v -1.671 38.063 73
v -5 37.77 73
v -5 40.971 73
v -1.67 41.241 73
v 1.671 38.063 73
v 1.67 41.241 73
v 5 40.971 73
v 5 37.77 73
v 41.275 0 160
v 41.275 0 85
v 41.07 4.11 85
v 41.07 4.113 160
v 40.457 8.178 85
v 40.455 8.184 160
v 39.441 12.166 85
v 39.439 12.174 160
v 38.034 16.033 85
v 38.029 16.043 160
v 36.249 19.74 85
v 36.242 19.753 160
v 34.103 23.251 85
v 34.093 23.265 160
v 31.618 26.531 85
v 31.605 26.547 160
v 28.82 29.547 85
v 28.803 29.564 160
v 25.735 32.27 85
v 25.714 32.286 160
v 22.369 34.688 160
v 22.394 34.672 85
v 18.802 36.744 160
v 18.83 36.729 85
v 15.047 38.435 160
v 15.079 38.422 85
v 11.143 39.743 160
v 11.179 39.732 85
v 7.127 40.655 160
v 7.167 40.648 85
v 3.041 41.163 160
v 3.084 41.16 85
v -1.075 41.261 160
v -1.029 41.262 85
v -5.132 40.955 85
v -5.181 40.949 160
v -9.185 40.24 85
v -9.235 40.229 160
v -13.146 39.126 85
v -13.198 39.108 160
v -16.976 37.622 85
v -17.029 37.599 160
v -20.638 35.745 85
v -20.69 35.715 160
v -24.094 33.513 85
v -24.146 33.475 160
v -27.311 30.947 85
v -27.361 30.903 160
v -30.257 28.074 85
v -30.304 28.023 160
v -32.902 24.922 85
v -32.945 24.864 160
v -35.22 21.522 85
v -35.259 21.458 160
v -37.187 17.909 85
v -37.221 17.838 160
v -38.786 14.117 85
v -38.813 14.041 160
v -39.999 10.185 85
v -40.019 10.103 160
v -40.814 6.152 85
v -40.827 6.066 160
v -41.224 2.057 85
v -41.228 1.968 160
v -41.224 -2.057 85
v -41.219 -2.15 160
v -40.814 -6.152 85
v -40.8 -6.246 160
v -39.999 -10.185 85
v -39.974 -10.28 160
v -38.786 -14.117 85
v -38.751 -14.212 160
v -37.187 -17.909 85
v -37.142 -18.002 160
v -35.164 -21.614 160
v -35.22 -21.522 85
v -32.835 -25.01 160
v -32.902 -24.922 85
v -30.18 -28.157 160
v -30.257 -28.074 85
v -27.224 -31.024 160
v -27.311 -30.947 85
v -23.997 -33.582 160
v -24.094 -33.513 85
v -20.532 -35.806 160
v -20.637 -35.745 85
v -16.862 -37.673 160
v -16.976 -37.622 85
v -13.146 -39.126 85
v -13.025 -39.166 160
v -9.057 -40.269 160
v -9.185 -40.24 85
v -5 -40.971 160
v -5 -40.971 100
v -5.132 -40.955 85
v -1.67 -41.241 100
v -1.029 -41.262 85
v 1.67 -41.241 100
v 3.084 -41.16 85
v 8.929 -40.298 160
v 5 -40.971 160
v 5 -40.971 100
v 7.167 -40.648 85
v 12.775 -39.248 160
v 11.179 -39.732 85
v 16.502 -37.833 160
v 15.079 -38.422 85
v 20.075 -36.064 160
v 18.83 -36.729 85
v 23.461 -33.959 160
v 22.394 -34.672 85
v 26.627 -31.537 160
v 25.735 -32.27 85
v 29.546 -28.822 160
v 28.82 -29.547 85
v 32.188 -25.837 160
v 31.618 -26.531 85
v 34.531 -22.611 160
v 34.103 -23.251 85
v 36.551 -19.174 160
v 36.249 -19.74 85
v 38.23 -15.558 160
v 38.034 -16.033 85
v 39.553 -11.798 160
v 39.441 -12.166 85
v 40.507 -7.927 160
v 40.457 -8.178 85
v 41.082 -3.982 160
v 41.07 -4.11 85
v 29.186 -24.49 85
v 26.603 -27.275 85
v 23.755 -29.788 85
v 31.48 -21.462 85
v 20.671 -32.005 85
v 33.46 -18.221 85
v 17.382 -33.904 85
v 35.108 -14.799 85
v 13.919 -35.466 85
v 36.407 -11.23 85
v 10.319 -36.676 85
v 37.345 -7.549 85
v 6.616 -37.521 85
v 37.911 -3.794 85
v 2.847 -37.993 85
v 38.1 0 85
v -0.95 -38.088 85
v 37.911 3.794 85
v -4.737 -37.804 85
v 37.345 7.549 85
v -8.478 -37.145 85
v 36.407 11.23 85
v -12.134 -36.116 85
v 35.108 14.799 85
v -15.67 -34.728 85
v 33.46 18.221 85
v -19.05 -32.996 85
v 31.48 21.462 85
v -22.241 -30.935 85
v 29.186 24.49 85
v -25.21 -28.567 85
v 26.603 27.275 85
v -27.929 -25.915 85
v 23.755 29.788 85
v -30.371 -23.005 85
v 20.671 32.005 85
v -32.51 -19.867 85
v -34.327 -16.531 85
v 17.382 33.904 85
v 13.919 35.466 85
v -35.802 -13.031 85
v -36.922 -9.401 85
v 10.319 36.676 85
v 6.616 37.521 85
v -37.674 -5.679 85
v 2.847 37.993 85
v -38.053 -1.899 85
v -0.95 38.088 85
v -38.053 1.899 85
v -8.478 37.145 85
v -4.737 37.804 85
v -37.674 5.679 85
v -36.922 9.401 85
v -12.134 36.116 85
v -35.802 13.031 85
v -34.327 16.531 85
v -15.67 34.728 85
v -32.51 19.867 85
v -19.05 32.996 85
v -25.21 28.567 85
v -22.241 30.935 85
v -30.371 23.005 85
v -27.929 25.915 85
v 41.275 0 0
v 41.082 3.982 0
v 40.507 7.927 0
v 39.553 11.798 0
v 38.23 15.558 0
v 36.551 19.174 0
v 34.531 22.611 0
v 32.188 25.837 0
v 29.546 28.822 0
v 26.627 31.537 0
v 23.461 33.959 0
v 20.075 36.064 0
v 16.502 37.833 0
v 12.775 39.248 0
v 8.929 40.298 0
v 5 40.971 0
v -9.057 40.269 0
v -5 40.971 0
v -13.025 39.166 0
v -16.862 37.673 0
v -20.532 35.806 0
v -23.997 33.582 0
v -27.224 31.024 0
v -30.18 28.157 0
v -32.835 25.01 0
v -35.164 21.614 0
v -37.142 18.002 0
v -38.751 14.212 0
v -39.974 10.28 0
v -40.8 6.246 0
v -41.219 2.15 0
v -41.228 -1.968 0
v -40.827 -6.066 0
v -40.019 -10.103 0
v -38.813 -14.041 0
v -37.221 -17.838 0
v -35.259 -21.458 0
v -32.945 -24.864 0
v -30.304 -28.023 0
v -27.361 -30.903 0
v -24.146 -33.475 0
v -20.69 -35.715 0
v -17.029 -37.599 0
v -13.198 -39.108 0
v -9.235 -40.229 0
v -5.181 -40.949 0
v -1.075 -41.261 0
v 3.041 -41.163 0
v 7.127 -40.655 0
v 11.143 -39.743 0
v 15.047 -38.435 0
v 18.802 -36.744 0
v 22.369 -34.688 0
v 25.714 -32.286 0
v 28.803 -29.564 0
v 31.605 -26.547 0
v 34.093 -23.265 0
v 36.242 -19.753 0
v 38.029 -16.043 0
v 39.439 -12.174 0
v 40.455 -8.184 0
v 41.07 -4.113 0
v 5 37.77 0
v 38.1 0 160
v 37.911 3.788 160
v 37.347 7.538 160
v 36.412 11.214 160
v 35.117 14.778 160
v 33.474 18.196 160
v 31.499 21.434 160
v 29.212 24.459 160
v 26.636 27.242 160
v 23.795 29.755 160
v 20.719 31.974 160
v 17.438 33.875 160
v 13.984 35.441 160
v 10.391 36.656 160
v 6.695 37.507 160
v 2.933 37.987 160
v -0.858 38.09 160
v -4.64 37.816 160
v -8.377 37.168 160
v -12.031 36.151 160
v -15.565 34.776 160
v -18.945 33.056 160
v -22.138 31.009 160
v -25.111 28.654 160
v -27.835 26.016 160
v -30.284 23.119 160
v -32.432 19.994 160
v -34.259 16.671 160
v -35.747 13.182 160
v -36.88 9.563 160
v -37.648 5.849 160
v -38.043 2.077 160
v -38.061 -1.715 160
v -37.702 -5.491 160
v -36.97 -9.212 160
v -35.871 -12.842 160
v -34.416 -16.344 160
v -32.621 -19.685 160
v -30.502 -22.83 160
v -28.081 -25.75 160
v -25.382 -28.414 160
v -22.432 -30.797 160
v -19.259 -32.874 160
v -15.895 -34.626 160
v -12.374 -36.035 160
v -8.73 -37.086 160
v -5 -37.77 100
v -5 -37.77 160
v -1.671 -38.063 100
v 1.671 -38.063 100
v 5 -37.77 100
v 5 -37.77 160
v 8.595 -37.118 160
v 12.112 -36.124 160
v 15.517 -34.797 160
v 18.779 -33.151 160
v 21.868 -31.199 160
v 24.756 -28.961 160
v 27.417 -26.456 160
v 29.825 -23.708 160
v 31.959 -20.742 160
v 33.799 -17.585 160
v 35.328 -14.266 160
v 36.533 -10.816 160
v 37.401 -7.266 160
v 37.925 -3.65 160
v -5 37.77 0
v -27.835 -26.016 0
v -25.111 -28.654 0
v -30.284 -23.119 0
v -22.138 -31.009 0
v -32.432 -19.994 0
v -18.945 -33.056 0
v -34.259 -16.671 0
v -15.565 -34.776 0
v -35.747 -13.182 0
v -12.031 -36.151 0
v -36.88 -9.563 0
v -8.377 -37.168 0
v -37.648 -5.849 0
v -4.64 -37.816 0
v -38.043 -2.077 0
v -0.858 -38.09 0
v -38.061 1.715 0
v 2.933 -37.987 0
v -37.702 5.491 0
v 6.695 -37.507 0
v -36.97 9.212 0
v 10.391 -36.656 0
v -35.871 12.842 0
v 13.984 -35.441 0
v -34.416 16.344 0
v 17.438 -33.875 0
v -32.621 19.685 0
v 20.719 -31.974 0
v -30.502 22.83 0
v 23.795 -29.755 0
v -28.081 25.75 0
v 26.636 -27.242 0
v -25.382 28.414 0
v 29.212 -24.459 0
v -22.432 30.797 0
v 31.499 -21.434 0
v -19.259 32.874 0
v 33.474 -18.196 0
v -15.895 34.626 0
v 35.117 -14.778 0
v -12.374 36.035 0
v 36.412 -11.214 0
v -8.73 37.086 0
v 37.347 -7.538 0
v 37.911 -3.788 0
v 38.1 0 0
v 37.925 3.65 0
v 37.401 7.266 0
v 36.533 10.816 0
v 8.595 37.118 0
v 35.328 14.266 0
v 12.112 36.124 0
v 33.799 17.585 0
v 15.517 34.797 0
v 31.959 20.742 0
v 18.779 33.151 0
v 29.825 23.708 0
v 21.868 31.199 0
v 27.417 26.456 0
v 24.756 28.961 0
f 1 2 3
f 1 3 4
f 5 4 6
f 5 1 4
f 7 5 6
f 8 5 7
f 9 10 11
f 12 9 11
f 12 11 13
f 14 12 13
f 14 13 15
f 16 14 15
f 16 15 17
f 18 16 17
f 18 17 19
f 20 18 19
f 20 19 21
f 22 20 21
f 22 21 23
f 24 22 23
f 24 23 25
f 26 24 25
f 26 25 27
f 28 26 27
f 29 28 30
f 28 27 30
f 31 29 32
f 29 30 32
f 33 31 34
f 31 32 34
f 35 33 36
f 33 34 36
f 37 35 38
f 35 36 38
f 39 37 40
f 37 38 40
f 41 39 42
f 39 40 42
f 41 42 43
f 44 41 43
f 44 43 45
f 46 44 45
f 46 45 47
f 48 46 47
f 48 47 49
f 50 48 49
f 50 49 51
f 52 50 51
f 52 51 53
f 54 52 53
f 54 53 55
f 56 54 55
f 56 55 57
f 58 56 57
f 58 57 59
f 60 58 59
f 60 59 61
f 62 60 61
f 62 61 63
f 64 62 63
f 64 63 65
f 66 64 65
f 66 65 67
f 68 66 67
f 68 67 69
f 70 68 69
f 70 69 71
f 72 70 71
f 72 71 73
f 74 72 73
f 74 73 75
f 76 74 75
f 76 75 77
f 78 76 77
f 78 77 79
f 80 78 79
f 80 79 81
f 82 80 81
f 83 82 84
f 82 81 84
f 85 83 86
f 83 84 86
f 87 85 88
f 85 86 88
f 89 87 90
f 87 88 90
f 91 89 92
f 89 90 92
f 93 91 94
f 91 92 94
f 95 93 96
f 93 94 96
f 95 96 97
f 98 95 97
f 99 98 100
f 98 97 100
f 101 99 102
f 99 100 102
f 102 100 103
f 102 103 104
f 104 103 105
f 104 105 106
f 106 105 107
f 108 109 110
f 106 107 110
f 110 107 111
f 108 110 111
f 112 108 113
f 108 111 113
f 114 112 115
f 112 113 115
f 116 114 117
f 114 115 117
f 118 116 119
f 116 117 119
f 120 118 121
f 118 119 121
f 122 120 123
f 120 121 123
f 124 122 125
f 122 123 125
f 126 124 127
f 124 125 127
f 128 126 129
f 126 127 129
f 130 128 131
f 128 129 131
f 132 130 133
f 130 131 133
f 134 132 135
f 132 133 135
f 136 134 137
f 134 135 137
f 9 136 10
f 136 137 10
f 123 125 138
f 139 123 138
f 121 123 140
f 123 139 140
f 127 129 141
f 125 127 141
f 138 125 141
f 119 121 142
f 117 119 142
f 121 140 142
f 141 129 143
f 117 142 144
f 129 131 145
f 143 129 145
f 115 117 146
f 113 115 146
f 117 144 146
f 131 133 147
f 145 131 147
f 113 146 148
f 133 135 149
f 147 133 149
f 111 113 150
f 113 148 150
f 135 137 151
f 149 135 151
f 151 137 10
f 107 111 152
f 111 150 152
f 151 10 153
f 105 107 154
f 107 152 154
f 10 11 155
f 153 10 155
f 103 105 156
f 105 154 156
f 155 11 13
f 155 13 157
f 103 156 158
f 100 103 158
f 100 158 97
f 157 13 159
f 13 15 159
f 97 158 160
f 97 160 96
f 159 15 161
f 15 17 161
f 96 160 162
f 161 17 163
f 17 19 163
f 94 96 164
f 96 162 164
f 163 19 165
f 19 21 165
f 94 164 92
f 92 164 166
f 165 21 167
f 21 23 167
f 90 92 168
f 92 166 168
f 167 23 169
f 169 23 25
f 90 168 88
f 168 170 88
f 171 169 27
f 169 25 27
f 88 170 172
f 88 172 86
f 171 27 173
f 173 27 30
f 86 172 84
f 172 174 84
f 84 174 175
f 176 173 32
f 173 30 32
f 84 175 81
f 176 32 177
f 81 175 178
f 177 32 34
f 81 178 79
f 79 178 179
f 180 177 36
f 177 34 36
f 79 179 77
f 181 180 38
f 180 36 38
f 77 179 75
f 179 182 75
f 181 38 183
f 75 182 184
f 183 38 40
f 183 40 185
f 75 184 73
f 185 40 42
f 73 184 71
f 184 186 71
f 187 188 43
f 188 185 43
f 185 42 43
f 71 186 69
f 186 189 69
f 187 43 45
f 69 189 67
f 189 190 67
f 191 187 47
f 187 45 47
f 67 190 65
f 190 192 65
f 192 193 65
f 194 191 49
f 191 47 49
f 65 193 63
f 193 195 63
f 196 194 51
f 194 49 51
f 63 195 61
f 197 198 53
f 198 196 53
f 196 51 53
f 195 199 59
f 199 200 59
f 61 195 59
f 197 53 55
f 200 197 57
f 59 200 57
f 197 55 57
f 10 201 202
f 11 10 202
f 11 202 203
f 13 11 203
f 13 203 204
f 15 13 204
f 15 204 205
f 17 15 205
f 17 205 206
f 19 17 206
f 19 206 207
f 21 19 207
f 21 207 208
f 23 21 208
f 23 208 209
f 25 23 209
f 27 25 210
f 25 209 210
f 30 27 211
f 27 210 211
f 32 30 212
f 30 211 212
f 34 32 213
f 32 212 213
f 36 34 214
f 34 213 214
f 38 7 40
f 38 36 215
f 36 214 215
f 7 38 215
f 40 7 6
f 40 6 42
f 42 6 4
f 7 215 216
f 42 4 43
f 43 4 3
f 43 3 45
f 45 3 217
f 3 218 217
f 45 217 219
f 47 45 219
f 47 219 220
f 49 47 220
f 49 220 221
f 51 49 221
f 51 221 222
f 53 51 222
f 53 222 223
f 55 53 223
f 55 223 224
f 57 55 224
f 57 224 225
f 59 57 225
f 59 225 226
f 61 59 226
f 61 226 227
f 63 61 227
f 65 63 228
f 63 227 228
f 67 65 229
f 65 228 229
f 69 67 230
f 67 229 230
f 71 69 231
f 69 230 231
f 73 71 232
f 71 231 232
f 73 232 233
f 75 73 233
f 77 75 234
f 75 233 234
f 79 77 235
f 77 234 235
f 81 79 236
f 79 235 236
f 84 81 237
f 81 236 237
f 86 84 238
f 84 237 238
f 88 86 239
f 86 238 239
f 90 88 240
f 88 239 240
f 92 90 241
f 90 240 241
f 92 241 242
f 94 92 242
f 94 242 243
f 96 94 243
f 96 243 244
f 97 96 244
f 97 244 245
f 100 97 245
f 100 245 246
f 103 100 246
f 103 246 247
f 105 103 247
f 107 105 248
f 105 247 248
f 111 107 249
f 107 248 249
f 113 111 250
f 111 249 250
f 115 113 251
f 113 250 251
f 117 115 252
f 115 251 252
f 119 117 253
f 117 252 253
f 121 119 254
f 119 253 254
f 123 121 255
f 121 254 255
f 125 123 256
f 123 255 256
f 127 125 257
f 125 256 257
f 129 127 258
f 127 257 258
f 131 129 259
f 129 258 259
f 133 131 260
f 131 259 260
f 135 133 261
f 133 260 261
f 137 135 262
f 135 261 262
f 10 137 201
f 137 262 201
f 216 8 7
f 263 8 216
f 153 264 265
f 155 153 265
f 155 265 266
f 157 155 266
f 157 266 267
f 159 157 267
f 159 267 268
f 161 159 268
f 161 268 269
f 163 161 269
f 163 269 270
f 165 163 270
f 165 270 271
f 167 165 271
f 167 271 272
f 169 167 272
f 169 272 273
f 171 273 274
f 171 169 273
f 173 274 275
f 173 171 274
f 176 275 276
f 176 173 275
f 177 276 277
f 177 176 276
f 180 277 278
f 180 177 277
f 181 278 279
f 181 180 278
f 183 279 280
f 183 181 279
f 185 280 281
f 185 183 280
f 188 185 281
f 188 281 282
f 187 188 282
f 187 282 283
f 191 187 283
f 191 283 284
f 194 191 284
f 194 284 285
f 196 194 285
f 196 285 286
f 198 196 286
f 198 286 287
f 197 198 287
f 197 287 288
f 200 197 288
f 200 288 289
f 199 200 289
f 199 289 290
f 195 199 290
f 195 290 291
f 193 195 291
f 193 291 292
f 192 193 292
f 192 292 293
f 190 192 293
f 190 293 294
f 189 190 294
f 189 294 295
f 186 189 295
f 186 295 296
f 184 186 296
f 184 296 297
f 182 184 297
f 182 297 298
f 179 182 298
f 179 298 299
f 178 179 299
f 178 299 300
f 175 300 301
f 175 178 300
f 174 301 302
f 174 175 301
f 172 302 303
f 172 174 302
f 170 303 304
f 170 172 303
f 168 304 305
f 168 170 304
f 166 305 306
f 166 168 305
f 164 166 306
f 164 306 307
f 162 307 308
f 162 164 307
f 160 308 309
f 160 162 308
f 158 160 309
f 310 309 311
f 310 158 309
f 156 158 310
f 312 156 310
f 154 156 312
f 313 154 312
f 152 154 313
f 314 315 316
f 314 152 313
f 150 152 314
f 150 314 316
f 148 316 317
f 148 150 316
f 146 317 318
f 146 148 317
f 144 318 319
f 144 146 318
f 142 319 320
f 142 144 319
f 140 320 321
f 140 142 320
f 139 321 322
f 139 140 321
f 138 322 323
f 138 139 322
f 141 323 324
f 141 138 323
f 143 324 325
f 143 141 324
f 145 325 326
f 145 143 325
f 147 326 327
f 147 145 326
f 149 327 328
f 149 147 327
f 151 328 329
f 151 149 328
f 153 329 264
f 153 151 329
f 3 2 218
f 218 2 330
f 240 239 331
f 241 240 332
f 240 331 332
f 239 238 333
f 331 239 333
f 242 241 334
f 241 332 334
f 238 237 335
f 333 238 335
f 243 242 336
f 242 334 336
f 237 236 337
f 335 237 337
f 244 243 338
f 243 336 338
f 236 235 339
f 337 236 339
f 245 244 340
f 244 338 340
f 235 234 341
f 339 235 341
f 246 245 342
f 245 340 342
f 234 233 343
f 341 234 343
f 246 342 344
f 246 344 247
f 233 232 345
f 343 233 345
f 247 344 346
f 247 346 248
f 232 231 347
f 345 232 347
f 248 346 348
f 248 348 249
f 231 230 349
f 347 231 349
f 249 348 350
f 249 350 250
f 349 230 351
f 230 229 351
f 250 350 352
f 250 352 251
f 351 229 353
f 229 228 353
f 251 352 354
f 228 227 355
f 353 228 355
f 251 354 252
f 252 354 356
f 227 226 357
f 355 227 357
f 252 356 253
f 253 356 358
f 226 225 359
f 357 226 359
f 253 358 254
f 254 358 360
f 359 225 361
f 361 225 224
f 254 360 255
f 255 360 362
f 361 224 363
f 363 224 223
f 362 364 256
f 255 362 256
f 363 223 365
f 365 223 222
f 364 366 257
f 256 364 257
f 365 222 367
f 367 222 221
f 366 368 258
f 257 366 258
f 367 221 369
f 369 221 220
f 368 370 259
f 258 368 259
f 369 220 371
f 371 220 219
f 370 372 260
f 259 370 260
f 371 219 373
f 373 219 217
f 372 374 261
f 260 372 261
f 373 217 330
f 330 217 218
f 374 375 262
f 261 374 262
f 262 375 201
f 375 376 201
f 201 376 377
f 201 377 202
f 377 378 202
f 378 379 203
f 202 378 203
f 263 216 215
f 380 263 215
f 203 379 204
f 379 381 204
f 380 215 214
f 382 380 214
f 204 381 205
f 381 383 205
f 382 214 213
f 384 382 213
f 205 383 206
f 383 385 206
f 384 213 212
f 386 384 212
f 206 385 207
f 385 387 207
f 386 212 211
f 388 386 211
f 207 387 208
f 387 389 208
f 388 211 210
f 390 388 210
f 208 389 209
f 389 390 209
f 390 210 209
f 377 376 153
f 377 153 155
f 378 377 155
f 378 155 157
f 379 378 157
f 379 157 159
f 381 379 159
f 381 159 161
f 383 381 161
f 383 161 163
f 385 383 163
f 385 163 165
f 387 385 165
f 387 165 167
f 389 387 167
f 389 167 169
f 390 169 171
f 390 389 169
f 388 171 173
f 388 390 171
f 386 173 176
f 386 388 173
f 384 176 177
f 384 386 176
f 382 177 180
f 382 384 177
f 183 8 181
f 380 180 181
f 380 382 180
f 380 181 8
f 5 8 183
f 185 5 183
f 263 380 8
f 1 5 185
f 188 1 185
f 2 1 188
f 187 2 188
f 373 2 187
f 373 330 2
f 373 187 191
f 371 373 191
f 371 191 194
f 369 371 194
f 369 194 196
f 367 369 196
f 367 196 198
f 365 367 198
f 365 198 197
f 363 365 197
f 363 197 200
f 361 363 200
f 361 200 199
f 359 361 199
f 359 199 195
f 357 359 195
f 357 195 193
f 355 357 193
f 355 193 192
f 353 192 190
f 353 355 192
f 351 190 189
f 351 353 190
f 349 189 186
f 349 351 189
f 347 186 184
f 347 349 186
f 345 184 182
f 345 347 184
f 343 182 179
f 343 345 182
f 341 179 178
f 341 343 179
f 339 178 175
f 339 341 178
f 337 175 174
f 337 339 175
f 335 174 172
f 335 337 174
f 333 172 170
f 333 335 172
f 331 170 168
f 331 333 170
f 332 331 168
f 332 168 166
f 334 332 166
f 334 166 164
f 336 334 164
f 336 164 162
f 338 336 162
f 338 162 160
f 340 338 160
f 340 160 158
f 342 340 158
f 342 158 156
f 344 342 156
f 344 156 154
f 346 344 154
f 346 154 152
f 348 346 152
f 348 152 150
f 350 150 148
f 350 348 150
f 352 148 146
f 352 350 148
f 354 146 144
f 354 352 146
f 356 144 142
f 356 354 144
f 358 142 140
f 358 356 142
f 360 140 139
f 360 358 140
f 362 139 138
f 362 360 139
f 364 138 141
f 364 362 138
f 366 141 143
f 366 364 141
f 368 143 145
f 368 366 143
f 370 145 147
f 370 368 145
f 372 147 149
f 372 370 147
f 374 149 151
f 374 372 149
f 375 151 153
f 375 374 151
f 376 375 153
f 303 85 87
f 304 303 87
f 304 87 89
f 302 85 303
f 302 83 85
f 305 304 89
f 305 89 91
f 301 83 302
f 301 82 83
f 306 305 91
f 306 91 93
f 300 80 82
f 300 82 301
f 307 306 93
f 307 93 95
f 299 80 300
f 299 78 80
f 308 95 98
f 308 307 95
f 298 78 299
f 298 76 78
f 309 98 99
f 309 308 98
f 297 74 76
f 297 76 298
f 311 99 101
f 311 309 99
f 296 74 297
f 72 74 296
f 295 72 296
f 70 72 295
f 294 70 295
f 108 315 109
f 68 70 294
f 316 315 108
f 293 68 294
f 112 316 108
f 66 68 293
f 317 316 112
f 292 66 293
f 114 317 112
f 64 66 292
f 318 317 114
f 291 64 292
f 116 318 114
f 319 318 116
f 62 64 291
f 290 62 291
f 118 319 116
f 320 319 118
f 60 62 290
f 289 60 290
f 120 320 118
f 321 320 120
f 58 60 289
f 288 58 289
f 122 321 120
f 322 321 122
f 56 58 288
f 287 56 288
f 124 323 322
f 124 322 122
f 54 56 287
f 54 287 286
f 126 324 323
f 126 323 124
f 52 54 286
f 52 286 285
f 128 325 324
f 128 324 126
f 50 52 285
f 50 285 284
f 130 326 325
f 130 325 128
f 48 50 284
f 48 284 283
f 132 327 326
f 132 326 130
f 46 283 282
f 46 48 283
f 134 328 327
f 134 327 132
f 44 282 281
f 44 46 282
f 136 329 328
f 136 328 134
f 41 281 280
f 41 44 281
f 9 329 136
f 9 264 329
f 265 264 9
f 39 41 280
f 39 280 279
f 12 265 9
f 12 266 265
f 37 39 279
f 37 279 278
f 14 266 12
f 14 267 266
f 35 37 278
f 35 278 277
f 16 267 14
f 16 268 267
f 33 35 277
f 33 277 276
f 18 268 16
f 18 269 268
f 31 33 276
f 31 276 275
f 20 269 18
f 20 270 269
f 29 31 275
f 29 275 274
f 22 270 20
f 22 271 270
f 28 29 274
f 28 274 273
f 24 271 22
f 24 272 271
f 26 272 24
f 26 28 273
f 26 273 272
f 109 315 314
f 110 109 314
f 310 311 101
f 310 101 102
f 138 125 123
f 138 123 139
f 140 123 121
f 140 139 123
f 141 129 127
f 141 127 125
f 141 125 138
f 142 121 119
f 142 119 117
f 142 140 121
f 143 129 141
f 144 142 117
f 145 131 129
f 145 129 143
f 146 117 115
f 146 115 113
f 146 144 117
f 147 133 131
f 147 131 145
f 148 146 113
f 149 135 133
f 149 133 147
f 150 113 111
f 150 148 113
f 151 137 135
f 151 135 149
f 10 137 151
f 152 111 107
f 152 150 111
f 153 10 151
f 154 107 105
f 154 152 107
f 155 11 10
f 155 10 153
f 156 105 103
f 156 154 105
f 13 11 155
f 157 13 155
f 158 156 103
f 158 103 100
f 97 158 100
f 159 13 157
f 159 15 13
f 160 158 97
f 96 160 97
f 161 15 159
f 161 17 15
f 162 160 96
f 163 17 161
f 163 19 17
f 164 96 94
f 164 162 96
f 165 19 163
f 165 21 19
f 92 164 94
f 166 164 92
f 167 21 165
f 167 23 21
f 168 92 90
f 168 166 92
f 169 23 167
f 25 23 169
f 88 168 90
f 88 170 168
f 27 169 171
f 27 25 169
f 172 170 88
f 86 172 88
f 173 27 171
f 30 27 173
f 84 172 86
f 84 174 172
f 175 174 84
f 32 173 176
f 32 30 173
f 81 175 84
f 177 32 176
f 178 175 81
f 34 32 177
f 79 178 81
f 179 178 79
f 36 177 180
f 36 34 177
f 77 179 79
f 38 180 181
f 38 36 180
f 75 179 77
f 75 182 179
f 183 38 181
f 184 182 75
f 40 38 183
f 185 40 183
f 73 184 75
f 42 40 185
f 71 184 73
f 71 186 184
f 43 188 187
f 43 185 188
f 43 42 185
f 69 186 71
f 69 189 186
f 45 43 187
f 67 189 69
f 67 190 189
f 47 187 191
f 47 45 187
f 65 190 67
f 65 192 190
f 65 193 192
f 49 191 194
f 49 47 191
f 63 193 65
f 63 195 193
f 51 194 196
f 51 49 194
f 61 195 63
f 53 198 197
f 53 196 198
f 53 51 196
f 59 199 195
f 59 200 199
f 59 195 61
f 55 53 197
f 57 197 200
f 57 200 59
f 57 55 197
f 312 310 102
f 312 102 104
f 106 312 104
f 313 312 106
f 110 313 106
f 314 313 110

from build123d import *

# Parameters (mm, degrees)
SKETCH1_R           = 41.275
SKETCH1_R_2         = 38.1
BOSS_EXTRUDE1_DEPTH = 160
SKETCH2_W           = 10
SKETCH2_H           = 60
CUT_EXTRUDE1_DEPTH  = 50
SKETCH3_W           = 10
SKETCH3_H           = 73
CUT_EXTRUDE2_DEPTH  = 50


with BuildPart() as part:
    # Sketch1 → Boss-Extrude1 (new body)
    with BuildSketch(Plane.XY):
        Circle(SKETCH1_R)
        Circle(SKETCH1_R_2, mode=Mode.SUBTRACT)
    extrude(amount=BOSS_EXTRUDE1_DEPTH)

    # Sketch2 → Cut-Extrude1 (cut)
    with BuildSketch(Plane(origin=(0, 0, 0), x_dir=(1, 0, 0), z_dir=(0, 1, 0))):
        with Locations((0, -130)):
            Rectangle(SKETCH2_W, SKETCH2_H)
    extrude(amount=-CUT_EXTRUDE1_DEPTH, mode=Mode.SUBTRACT)

    # Sketch3 → Cut-Extrude2 (cut)
    with BuildSketch(Plane(origin=(0, 0, 0), x_dir=(1, 0, 0), z_dir=(0, 1, 0))):
        with Locations((0, -36.5)):
            Rectangle(SKETCH3_W, SKETCH3_H)
    extrude(amount=CUT_EXTRUDE2_DEPTH, mode=Mode.SUBTRACT)


with BuildPart() as body_2:
    # Split1: the piece on the far side of the plane
    add(part.part)
    split(bisect_by=Plane(origin=(0, 0, 85), x_dir=(-1, 0, 0), z_dir=(0, 0, -1)), keep=Keep.BOTTOM)


with BuildPart() as part_1:
    add(part.part)

    # Split1
    split(bisect_by=Plane(origin=(0, 0, 85), x_dir=(-1, 0, 0), z_dir=(0, 0, -1)), keep=Keep.TOP)


solid = Compound([body_2.part, part_1.part])
